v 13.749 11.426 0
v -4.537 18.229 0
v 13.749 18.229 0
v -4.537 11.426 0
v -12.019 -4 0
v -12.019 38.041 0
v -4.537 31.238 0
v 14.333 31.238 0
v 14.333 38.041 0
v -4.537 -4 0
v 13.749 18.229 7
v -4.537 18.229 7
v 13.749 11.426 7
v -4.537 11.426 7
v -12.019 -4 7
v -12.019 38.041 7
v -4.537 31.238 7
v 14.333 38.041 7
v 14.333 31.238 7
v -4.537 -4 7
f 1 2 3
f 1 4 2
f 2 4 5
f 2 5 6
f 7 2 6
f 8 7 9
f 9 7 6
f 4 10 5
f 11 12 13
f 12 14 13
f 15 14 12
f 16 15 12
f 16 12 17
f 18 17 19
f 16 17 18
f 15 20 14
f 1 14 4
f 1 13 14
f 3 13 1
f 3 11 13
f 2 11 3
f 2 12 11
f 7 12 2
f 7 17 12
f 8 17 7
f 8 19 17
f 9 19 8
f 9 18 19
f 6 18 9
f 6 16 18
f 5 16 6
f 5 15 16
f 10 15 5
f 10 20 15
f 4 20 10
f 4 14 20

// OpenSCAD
// file: glyph.scad
// glyph — the shared geometry of every letter in the set. Defines named geometry
// only, so it renders nothing on its own; each letter part includes it and calls
// letter(). Every dimension lives in ../../lib/common.scad.
//
// A LETTER IS NOTHING BUT A LETTER. No plinth, no tongue, no tab — it is the
// bare glyph, and it attaches by standing in the deck groove and resting on the
// groove's floor. Anything else on it would be a distraction on a learning toy.
//
// It is a flat plate of one thickness, printed face-down: no overhang anywhere,
// no supports, and the face on the bed comes out smoothest.
//
// TWO TRAPS WITH text():
//
//  * A missing font FALLS BACK SILENTLY — no warning, no error, just different
//    letters. "Liberation Sans" was the first choice here because OpenSCAD
//    bundles it; on macOS the bundled faces are not registered with fontconfig,
//    so it rendered the fallback face instead and nothing said so. To check a
//    font resolved, render a string with it and with a deliberately bogus name
//    and compare bounding boxes: identical means it fell back.
//  * `size` is not the cap height in general. For Helvetica Bold they coincide
//    (size 44 -> 44.0 mm cap), which is why letter_size reads as a height.
//    Change the font and re-measure.

include <../../lib/common.scad>

// The letter's outline, upright in the XY plane, ready to be extruded along Z
// (which is the letter's thickness, and the print's build axis).
//
//   y = 0   is the deck surface
//   y < 0   is the part standing down inside the groove. It reaches letter_bury,
//           which is where the tapered groove closes to letter_t — NOT the
//           groove's floor. The letter wedges; it never bottoms out.
module glyph_2d(ch) {
    intersection() {
        translate([0, -letter_bury])
            scale([letter_condense, 1])
                text(ch, size = letter_size, font = letter_font,
                     halign = "center", valign = "baseline");
        // Trimmed flat at the baseline. Round letters (O, C, G, S) overshoot the
        // baseline by design, and a letter standing on a convex curve rocks —
        // there is nothing to stop it leaning. The trim costs nothing visible
        // and gives every letter a flat foot on the groove floor.
        translate([-200, -letter_bury]) square([400, 400]);
    }
}

// One letter, in its print orientation: lying on its face, thickness up Z.
module letter(ch) {
    linear_extrude(letter_t) glyph_2d(ch);
}

// Where that letter sits once it is dropped into a chassis, for fit checks.
module letter_fitted(ch) {
    translate([0, letter_t/2, body_top]) rotate([90, 0, 0]) letter(ch);
}
// main file
// letter F — one part. See glyph.scad for the geometry and lib/common.scad for
// the dimensions. Prints lying on its face, exactly as exported: no supports.

include <glyph.scad>

letter("F");
